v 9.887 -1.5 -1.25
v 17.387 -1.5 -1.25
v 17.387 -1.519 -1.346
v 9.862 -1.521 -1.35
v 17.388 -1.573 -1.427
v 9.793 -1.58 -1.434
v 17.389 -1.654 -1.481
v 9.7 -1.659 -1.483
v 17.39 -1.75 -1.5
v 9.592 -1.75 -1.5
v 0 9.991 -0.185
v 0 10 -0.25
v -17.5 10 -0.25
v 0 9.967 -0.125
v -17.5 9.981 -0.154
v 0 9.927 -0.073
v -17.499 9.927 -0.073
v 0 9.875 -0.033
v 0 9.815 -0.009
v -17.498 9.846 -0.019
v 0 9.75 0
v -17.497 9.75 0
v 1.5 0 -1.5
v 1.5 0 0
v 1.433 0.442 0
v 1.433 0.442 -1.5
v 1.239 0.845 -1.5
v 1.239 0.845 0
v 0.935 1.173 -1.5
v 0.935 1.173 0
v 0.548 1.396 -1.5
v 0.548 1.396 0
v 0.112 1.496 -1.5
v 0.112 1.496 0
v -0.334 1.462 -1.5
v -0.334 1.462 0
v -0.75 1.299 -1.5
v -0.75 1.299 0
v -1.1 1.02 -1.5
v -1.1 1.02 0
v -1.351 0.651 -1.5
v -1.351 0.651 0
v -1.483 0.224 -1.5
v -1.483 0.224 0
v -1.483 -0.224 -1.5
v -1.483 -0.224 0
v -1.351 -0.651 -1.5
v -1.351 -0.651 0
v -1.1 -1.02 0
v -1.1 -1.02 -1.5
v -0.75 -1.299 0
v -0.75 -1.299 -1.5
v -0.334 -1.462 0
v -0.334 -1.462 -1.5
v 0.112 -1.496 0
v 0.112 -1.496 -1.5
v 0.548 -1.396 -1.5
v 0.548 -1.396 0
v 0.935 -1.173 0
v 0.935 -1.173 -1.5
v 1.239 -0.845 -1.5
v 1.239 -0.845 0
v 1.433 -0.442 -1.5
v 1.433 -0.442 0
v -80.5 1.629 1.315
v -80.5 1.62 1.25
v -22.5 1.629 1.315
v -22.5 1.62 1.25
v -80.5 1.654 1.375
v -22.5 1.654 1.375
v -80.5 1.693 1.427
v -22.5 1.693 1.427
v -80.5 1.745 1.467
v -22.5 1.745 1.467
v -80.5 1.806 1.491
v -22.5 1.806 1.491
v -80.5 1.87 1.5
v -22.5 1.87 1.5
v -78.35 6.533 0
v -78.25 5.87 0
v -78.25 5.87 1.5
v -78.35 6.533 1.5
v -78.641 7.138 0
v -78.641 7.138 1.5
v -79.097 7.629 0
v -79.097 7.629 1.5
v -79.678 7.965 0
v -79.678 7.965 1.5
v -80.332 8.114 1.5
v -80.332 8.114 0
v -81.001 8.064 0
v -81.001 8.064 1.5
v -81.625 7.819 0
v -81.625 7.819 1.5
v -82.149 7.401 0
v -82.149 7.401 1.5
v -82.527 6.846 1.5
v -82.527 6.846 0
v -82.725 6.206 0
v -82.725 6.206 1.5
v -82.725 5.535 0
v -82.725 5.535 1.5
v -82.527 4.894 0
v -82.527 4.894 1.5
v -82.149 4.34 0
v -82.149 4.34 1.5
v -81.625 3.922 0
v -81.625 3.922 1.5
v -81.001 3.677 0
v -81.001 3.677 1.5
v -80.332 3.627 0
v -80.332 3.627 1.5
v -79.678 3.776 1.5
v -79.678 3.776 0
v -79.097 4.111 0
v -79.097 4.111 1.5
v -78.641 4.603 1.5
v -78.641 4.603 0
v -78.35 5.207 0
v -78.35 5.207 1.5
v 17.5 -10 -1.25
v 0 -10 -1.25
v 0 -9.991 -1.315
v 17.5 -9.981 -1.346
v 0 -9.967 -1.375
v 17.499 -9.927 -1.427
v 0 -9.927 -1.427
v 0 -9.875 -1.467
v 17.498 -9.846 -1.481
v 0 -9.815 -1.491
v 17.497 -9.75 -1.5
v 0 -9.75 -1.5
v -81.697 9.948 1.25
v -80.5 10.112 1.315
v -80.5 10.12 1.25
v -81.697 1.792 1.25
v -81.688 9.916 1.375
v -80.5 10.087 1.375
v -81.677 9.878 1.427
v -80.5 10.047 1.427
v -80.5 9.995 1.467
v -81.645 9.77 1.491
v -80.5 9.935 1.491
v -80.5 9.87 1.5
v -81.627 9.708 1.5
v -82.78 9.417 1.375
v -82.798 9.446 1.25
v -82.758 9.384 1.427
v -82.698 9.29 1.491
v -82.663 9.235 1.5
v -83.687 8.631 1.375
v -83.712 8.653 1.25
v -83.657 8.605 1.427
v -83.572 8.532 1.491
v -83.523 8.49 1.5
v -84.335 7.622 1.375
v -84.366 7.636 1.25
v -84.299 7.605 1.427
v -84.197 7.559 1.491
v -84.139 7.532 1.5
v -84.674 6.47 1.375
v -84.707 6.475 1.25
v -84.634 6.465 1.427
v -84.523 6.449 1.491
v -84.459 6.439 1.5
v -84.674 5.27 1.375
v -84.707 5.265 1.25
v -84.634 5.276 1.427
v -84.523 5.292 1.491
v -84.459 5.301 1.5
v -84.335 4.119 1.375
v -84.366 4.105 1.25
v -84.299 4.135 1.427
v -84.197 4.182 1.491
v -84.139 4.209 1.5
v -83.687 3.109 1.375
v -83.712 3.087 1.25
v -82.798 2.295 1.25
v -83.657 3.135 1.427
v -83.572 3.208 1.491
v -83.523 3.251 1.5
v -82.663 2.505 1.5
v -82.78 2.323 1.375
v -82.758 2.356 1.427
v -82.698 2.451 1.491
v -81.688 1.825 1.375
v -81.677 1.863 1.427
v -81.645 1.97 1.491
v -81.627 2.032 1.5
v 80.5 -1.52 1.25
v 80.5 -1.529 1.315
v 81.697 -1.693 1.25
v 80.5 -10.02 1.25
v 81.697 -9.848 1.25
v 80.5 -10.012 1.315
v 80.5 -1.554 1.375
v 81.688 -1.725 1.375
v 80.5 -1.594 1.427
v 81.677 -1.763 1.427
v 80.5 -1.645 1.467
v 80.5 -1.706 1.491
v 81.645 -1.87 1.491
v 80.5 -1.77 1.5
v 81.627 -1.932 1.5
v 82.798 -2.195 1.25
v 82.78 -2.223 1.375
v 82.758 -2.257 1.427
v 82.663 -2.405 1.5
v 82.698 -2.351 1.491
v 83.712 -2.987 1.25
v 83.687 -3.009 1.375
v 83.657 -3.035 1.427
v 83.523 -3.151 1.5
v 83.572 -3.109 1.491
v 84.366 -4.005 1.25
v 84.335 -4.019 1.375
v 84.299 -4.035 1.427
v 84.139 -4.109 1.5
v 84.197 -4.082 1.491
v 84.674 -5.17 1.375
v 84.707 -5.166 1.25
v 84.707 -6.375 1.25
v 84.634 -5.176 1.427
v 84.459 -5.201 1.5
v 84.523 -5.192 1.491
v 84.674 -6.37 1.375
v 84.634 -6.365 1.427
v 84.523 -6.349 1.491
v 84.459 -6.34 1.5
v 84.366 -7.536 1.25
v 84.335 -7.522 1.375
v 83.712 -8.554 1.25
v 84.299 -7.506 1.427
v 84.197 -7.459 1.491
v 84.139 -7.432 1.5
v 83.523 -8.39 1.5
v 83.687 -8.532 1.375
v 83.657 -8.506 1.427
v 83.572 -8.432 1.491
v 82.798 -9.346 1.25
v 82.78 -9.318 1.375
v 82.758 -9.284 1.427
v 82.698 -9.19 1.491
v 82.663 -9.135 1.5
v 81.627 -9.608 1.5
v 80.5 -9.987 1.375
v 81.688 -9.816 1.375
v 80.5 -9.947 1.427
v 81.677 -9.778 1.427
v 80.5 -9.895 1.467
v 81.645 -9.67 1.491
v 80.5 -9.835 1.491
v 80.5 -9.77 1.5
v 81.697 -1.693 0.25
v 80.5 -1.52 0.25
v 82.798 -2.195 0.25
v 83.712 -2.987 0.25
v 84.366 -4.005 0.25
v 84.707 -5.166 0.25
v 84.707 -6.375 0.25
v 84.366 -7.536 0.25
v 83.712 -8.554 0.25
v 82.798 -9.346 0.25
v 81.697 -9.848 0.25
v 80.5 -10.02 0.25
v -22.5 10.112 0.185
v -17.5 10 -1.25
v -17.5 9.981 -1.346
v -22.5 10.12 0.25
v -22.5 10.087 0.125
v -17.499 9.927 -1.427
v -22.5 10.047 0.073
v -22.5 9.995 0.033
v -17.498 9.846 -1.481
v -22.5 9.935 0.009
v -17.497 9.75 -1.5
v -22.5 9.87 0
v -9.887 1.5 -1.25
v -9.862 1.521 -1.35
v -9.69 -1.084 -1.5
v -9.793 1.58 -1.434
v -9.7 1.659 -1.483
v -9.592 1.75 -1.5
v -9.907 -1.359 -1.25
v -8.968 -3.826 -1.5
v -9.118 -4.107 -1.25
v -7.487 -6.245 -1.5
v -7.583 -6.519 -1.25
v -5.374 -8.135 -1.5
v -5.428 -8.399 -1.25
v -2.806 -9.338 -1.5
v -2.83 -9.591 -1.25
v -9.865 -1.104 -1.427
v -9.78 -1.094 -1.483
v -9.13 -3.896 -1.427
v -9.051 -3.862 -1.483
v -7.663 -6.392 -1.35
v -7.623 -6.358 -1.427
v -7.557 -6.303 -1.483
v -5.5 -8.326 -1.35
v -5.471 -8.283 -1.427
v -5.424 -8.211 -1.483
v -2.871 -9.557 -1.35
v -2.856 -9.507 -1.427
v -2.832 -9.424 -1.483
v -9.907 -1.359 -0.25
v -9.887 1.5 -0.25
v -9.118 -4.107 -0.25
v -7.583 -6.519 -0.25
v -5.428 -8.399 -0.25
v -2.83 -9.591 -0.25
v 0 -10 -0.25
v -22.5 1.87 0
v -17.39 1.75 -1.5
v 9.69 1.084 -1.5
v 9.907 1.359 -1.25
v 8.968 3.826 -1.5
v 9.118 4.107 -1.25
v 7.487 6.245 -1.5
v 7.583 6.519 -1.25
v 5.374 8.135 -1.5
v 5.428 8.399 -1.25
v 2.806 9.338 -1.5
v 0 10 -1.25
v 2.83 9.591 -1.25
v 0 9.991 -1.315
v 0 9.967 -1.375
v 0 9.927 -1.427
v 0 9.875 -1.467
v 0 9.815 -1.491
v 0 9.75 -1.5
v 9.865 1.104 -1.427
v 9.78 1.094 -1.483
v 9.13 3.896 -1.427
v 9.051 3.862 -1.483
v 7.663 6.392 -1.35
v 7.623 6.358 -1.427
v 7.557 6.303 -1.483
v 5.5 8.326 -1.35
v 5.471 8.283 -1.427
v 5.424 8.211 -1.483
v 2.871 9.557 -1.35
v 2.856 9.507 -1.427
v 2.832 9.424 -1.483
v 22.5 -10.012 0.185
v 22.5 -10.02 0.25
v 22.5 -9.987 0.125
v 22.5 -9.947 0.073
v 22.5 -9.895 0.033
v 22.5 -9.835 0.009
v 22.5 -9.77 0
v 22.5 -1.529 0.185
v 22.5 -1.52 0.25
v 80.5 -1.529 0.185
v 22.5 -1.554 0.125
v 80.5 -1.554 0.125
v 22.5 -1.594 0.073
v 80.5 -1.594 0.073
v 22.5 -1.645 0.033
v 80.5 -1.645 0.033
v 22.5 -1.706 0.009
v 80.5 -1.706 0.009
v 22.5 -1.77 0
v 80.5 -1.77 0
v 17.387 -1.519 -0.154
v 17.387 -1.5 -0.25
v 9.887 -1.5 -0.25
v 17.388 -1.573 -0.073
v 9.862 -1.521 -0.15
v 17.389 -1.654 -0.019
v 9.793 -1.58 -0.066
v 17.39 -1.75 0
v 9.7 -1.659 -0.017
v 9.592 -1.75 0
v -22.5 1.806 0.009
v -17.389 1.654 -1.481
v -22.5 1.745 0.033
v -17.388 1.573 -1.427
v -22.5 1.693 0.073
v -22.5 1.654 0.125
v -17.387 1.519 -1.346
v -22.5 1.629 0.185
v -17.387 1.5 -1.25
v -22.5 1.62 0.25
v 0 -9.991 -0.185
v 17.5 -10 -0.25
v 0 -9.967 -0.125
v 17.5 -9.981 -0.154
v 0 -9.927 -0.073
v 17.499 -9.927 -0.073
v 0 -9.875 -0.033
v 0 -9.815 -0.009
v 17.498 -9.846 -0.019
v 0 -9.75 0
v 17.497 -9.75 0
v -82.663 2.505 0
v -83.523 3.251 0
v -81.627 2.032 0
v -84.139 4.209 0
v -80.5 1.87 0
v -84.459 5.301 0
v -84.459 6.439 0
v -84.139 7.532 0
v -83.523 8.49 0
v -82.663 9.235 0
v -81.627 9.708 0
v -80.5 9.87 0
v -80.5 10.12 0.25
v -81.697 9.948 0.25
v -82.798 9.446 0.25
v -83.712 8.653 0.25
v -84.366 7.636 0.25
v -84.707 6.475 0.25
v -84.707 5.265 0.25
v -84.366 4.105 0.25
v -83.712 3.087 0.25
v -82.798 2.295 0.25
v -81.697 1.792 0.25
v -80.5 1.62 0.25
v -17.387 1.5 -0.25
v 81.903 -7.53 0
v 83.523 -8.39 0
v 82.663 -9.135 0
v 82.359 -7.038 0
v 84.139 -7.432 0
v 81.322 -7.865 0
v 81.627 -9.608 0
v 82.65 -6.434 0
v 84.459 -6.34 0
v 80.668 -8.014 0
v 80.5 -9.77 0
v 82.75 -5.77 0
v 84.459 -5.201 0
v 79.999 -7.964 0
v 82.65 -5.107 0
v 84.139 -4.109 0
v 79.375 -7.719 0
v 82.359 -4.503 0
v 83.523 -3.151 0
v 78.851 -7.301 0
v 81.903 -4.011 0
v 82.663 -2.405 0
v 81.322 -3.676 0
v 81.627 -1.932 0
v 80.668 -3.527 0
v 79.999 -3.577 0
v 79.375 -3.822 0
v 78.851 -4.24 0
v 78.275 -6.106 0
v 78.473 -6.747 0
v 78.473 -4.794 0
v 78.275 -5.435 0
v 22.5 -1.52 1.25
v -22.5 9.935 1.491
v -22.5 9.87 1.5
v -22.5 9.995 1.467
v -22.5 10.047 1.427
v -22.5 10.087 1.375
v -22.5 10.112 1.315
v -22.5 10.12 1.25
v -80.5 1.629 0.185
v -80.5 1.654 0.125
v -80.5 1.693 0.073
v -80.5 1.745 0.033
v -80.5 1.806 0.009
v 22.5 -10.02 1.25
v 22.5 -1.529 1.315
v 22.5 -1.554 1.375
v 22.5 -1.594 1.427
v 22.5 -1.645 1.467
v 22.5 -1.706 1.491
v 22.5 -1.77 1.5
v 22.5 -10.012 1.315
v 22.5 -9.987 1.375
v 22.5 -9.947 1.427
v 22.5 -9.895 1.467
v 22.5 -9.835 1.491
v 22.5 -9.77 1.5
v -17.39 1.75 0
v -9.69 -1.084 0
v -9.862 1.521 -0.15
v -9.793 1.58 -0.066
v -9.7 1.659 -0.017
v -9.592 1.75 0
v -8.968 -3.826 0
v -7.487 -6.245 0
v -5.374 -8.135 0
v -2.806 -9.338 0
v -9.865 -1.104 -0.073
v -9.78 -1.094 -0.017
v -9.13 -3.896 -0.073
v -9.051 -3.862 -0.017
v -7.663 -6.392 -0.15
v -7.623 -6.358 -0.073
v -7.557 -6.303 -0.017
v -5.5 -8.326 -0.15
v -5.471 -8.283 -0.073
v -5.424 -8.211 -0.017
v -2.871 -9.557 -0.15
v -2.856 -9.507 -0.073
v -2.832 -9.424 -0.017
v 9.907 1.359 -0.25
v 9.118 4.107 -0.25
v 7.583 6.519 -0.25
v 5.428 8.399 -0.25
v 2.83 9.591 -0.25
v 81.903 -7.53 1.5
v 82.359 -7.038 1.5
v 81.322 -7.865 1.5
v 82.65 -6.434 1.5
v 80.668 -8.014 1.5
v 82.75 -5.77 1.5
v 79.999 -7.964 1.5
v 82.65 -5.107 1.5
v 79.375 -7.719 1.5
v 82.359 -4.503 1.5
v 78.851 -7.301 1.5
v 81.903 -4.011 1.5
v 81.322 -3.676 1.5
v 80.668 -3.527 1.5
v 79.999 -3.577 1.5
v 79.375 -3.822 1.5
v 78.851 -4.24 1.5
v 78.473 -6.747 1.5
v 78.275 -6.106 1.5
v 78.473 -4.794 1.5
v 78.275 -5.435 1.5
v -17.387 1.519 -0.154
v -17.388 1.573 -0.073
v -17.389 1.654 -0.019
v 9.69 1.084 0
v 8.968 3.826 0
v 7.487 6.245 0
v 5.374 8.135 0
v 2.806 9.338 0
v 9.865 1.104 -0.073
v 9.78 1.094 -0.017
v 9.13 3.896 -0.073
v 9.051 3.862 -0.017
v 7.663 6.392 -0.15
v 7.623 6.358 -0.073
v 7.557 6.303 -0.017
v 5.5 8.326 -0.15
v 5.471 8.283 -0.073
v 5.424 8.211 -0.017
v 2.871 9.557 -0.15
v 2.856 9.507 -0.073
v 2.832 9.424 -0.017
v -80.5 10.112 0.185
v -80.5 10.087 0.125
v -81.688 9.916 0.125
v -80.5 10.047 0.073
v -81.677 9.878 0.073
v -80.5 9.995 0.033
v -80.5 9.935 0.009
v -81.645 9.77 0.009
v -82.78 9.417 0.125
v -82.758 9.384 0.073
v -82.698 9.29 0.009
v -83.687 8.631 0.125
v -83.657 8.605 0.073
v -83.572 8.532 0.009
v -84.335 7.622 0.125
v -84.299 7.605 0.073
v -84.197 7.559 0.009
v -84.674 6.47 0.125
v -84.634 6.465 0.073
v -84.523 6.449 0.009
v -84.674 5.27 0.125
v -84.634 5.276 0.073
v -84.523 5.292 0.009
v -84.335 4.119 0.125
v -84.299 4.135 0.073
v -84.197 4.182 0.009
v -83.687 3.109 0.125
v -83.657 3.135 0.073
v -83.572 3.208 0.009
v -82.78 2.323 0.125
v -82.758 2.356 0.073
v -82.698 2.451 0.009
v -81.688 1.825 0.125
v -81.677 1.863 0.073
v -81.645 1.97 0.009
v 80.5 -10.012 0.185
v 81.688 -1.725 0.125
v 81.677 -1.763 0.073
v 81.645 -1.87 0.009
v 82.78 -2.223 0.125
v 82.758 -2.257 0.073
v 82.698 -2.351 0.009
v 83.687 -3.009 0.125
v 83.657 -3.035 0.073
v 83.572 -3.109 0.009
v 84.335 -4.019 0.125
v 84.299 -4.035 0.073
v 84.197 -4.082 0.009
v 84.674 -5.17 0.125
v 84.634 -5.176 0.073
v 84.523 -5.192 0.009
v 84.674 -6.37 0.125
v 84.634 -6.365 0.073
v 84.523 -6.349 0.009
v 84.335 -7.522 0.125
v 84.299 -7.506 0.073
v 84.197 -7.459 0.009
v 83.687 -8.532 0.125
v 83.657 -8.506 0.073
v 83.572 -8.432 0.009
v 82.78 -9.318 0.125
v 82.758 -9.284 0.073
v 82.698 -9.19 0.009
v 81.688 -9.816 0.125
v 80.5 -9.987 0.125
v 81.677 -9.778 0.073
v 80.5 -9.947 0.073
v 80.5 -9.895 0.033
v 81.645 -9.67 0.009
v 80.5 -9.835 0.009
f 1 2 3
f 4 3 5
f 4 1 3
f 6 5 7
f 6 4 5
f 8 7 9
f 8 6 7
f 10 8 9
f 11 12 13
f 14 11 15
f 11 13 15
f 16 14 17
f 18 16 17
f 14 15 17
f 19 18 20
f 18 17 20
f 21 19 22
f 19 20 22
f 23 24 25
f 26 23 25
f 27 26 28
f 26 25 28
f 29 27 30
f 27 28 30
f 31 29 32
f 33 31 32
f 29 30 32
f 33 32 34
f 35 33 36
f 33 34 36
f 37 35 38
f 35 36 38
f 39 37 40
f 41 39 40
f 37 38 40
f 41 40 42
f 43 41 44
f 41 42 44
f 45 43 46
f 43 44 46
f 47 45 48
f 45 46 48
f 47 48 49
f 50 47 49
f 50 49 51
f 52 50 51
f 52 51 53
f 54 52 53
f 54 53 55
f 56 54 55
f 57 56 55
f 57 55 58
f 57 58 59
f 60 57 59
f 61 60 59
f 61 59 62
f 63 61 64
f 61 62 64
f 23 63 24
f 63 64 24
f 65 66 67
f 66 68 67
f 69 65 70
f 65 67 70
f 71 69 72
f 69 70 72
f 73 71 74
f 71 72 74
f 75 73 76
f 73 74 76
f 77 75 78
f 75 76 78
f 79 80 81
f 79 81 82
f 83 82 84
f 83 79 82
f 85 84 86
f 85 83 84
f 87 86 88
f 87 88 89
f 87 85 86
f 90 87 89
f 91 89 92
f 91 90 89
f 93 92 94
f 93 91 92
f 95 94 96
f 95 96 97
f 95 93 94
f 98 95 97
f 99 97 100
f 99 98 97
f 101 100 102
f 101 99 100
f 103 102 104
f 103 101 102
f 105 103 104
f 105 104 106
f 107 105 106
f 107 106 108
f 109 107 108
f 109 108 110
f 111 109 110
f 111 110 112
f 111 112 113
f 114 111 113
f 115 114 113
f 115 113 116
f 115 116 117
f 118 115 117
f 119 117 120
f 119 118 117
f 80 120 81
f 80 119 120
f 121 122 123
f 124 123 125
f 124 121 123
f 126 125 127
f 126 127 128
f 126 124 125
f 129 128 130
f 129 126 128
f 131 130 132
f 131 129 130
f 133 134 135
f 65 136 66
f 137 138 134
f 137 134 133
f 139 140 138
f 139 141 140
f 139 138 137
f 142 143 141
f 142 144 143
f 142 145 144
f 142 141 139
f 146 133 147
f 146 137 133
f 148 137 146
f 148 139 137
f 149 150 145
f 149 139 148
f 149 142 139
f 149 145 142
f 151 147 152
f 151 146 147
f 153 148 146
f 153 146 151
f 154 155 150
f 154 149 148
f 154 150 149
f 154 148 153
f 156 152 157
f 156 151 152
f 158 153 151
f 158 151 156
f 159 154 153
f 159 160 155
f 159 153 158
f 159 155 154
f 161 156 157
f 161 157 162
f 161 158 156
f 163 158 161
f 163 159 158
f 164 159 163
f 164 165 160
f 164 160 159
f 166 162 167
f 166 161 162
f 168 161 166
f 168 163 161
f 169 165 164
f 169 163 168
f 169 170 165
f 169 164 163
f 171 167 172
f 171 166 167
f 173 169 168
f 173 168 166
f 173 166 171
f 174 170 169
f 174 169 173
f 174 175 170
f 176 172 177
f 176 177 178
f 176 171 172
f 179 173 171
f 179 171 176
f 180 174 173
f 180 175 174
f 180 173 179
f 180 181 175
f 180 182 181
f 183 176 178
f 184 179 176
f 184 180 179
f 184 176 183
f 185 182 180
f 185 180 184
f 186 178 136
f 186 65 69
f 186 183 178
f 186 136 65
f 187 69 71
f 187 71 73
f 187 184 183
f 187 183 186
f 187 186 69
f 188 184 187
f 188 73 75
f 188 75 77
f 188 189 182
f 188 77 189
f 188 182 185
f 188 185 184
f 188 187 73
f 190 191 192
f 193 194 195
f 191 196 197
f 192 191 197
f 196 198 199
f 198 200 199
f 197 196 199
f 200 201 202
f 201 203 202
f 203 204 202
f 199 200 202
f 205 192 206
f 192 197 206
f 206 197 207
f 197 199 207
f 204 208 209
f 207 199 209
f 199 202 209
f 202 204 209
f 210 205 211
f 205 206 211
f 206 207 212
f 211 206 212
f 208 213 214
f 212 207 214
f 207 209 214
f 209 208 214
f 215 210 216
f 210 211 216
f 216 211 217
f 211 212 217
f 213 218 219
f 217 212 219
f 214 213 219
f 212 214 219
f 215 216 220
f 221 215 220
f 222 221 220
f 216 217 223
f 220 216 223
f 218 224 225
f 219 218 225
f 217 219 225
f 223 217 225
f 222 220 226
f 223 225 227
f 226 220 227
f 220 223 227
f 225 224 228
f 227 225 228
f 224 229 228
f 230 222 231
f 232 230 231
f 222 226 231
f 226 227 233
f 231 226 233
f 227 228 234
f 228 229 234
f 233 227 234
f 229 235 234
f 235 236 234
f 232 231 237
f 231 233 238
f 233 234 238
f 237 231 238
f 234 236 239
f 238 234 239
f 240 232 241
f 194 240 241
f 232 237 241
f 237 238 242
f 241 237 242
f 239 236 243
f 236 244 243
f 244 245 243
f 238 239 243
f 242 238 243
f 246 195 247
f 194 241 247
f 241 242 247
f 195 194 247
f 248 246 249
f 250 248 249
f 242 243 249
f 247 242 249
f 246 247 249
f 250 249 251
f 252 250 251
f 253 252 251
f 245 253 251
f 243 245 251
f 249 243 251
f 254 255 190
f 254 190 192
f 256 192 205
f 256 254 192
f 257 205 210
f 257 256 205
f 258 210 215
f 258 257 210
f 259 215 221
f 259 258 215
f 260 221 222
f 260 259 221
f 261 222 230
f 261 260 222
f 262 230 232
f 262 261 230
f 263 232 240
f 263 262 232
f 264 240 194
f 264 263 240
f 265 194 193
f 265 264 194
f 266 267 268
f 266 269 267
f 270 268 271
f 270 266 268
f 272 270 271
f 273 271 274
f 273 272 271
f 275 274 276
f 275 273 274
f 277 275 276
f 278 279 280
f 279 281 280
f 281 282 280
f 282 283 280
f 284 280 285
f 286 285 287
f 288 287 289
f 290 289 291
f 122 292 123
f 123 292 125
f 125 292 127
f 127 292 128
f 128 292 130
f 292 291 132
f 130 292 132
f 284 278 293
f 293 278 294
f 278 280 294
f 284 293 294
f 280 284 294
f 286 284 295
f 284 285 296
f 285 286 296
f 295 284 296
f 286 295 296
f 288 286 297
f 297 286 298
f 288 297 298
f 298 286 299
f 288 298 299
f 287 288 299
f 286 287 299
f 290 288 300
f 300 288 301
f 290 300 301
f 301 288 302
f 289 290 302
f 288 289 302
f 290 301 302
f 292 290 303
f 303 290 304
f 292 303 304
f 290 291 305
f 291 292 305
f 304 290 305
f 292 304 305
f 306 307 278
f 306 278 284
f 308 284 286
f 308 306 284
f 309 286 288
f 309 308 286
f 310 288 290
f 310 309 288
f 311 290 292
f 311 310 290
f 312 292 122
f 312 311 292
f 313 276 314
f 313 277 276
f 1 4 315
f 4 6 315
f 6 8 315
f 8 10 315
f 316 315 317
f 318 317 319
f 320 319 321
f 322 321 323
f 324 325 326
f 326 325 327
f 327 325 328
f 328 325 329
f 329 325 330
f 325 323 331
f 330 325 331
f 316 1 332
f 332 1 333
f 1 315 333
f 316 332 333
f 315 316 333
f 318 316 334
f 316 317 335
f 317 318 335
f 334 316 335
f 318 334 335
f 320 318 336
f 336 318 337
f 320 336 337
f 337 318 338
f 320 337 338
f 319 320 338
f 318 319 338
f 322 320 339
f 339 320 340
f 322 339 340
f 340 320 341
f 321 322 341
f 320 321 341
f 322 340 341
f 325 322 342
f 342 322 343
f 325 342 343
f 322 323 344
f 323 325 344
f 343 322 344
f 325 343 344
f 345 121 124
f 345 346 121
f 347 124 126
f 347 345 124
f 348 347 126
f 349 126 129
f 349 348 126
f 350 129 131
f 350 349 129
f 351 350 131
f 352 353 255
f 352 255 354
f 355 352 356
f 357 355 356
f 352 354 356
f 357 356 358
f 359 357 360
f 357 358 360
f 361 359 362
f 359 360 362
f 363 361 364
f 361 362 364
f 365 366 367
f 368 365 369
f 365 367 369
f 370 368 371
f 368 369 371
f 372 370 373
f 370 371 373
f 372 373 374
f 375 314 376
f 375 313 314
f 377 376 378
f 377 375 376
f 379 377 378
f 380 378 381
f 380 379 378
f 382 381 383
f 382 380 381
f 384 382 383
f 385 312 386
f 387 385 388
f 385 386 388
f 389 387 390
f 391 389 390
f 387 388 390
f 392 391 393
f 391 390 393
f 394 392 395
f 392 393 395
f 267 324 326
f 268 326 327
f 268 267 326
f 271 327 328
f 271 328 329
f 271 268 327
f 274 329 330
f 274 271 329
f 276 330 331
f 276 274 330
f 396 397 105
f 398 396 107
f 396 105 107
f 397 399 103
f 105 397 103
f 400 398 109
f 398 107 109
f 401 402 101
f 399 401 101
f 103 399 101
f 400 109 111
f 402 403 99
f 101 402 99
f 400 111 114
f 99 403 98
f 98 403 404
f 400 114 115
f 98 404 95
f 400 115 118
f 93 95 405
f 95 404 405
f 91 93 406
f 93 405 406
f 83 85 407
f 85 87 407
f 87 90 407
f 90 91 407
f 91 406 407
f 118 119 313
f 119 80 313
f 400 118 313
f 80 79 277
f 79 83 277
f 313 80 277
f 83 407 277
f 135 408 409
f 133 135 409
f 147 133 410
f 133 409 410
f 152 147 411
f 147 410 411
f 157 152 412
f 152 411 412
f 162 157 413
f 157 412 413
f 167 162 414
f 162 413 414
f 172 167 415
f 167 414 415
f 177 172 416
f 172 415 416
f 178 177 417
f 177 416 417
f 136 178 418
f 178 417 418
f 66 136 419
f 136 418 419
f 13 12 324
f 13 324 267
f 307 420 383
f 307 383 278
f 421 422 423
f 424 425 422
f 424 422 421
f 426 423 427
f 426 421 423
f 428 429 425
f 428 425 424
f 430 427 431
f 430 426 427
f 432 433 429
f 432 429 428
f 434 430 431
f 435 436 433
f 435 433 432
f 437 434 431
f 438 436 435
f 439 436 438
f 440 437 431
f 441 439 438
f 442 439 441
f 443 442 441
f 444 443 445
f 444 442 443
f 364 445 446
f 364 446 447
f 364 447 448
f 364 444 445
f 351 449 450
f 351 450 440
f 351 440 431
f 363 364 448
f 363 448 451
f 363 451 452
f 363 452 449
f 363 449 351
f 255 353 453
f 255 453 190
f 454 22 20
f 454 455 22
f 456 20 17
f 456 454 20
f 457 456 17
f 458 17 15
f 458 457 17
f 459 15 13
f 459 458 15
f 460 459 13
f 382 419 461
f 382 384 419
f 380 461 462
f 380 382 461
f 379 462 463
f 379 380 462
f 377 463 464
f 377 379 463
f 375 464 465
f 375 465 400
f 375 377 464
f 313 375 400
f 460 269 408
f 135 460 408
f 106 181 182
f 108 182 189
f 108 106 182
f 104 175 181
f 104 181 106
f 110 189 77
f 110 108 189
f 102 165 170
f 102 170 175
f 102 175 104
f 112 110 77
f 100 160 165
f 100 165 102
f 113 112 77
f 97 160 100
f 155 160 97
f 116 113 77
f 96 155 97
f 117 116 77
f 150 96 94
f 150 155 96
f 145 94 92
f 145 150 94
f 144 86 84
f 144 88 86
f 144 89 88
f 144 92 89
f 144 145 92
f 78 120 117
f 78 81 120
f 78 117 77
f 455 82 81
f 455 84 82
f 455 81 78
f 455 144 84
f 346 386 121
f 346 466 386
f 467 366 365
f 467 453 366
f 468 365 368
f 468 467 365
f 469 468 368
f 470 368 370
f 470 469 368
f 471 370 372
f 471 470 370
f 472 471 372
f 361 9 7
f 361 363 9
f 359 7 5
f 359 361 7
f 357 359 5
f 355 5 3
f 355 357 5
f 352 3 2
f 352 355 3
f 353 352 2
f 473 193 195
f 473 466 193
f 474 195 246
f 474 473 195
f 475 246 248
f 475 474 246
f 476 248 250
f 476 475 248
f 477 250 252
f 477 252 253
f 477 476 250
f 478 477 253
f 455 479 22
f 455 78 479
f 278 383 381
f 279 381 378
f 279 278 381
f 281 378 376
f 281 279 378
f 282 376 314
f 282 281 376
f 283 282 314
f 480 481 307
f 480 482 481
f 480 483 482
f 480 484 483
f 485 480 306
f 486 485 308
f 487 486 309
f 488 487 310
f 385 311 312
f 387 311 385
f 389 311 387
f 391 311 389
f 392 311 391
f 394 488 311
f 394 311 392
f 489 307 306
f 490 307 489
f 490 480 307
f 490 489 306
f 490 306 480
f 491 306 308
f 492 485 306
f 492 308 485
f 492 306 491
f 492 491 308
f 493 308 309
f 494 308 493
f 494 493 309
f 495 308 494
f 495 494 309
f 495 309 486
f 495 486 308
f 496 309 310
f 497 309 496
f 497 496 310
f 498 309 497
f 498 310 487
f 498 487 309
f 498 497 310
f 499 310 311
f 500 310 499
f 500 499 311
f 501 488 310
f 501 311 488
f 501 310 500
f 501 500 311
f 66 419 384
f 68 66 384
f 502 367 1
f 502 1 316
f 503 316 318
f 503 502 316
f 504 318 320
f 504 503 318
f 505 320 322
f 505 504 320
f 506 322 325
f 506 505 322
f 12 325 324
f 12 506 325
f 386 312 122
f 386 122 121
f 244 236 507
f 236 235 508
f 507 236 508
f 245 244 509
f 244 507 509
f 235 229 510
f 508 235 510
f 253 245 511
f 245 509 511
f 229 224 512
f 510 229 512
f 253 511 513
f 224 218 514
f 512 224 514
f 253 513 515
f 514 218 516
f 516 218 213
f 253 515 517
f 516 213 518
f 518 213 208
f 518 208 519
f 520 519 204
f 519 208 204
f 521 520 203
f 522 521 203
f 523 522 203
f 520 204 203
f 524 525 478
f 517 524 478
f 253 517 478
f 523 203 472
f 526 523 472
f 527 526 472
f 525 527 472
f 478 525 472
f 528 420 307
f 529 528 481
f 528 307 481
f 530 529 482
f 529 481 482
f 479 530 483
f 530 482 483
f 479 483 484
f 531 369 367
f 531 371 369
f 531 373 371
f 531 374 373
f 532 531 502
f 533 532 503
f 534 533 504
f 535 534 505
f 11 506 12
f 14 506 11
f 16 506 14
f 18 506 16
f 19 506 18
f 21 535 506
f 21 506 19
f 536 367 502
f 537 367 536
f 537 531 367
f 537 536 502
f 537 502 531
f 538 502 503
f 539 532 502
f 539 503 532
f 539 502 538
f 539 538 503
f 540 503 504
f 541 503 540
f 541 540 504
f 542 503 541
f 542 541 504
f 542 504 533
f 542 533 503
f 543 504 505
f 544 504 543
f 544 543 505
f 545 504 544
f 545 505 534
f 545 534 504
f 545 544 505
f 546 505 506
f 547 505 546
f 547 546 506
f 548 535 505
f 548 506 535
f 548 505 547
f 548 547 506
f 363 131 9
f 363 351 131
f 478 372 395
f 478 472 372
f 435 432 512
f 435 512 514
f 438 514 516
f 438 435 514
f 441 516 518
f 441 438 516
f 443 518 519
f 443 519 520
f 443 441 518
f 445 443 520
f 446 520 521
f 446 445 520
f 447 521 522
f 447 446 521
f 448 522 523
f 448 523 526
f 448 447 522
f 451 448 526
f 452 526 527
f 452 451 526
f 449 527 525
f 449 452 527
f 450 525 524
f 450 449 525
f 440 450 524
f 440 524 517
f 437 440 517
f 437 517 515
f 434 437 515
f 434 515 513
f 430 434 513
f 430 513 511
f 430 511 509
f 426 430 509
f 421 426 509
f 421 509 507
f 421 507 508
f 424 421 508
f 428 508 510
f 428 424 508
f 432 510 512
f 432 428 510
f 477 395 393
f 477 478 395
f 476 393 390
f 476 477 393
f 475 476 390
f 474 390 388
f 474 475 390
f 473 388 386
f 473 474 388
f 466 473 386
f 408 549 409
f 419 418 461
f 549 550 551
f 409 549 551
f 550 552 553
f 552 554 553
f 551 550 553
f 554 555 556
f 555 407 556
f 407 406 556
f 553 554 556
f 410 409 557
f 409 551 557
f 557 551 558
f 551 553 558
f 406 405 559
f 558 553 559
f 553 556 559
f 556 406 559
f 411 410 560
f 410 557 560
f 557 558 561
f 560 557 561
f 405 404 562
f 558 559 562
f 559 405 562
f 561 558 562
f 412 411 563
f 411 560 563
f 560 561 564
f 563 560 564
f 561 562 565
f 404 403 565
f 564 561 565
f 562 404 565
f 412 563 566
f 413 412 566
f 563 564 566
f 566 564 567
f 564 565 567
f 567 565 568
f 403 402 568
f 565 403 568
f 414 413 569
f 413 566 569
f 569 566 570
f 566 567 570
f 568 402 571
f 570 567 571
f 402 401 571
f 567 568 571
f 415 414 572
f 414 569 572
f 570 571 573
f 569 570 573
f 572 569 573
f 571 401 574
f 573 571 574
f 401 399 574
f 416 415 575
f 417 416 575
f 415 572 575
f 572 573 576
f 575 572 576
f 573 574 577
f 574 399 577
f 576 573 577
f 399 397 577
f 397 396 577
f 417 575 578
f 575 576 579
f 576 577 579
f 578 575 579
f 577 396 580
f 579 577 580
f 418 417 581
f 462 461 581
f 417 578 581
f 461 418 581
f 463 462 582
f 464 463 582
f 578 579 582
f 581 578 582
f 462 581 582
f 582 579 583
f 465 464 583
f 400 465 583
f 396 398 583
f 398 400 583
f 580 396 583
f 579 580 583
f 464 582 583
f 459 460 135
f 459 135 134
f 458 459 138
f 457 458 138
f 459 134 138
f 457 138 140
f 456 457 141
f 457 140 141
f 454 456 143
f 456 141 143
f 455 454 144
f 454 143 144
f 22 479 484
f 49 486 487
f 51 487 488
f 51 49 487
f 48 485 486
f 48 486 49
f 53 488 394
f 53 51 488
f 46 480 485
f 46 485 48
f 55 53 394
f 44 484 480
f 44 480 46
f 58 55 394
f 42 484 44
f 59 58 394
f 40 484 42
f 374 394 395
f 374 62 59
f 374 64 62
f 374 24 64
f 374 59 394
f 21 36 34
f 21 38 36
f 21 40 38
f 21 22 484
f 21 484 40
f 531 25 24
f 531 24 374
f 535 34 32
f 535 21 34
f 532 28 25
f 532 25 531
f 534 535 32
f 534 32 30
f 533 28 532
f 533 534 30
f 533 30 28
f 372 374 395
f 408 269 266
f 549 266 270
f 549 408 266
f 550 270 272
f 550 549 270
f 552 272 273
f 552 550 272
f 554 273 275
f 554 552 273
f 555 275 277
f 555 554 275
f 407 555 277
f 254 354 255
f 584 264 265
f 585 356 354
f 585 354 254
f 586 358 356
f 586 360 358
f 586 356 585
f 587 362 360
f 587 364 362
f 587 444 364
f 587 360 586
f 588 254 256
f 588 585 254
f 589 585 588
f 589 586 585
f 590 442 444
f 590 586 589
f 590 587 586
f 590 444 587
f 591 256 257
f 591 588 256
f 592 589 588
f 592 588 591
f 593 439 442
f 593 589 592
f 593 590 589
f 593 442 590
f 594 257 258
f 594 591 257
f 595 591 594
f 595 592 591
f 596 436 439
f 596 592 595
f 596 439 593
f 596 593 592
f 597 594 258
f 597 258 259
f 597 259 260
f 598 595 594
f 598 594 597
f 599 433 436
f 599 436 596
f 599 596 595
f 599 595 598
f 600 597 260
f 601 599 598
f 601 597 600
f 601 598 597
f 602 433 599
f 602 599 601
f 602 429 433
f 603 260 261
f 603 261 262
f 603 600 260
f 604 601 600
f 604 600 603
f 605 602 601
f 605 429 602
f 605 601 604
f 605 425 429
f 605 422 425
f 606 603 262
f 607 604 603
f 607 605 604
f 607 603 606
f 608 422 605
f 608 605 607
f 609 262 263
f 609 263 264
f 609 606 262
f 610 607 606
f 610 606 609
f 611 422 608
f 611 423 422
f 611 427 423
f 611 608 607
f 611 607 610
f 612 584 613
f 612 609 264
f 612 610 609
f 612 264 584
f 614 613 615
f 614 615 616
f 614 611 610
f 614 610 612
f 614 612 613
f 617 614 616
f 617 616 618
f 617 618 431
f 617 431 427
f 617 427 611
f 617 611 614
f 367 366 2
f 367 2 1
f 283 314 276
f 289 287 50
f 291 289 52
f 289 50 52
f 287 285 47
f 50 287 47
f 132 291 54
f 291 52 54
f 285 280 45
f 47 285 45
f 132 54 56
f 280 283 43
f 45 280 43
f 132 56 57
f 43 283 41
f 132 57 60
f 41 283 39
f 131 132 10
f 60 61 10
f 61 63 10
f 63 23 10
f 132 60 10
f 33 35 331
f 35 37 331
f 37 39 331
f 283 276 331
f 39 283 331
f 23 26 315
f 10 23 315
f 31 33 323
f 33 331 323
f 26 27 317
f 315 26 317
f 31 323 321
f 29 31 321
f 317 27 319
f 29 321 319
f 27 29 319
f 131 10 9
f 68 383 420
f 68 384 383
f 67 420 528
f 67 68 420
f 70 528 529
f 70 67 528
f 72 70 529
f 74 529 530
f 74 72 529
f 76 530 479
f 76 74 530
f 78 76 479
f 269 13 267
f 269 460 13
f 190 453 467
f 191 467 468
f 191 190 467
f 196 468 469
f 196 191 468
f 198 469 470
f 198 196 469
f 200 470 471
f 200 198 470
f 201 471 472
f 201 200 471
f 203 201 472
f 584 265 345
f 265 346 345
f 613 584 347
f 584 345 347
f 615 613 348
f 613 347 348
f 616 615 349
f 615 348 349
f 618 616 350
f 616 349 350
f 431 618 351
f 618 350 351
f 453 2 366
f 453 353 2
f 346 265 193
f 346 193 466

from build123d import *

# Parameters (mm, degrees)
SKETCH1_R             = 1.5
BOSS_EXTRUDE1_DEPTH   = 1.5
SKETCH2_R             = 2.25
BOSS_EXTRUDE2_DEPTH   = 1.5
BOSS_EXTRUDE2_2_DEPTH = 1.5
FILLET12_R            = 0.25
FILLET13_R            = 0.25
FILLET14_R            = 0.25


with BuildPart() as part:
    # Sketch1 → Boss-Extrude1 (new body)
    with BuildSketch(Plane.XY):
        with BuildLine():
            Line((-17.5, 10), (-17.386859967, 1.5))
            Line((-17.386859967, 1.5), (-9.886859967, 1.5))
            ThreePointArc((-9.886859967, 1.5), (-7.582875444, -6.519202405), (0, -10))
            Line((0, -10), (17.5, -10))
            Line((17.5, -10), (17.386859967, -1.5))
            Line((17.386859967, -1.5), (9.886859967, -1.5))
            ThreePointArc((9.886859967, -1.5), (7.582875444, 6.519202405), (0, 10))
            Line((0, 10), (-17.5, 10))
        make_face()
        Circle(SKETCH1_R, mode=Mode.SUBTRACT)
    extrude(amount=-BOSS_EXTRUDE1_DEPTH)

    # Fillet13
    fillet13_edges = [part.edges().sort_by_distance(p)[0] for p in [
        (13.636859967, -1.5, 0),
        (-8.75, 10, -1.5),
        (8.75, -10, 0),
        (-7.582875444, -6.519202405, 0),
        (-13.636859967, 1.5, 0),
        (-8.75, 10, 0),
        (7.582875444, 6.519202405, 0),
        (-13.636859967, 1.5, -1.5),
        (-7.582875444, -6.519202405, -1.5),
        (8.75, -10, -1.5),
        (13.636859967, -1.5, -1.5),
        (7.582875444, 6.519202405, -1.5),
    ]]
    fillet(fillet13_edges, radius=FILLET13_R)



with BuildPart() as body_2:
    # Sketch2 → Boss-Extrude2 (new body)
    with BuildSketch(Plane.XY):
        with BuildLine():
            Line((22.5, -1.520409702), (80.5, -1.520409702))
            ThreePointArc((80.5, -1.520409702), (84.75, -5.770409702), (80.5, -10.020409702))
            Line((80.5, -10.020409702), (22.5, -10.020409702))
            Line((22.5, -10.020409702), (22.5, -1.520409702))
        make_face()
        with Locations((80.5, -5.770409702)):
            Circle(SKETCH2_R, mode=Mode.SUBTRACT)
    extrude(amount=BOSS_EXTRUDE2_DEPTH)

    # Fillet12
    fillet12_edges = [body_2.edges().sort_by_distance(p)[0] for p in [
        (84.75, -5.770409702, 1.5),
        (51.5, -1.520409702, 1.5),
        (51.5, -1.520409702, 0),
        (84.75, -5.770409702, 0),
        (51.5, -10.020409702, 0),
        (51.5, -10.020409702, 1.5),
    ]]
    fillet(fillet12_edges, radius=FILLET12_R)


with BuildPart() as body_3:
    # Sketch2 → Boss-Extrude2 2 (new body)
    with BuildSketch(Plane.XY):
        with BuildLine():
            Line((-22.5, 10.120226545), (-80.5, 10.120226545))
            ThreePointArc((-80.5, 10.120226545), (-84.75, 5.870226545), (-80.5, 1.620226545))
            Line((-80.5, 1.620226545), (-22.5, 1.620226545))
            Line((-22.5, 1.620226545), (-22.5, 10.120226545))
        make_face()
        with Locations((-80.5, 5.870226545)):
            Circle(SKETCH2_R, mode=Mode.SUBTRACT)
    extrude(amount=BOSS_EXTRUDE2_2_DEPTH)

    # Fillet14
    fillet14_edges = [body_3.edges().sort_by_distance(p)[0] for p in [
        (-51.5, 10.120226545, 0),
        (-84.75, 5.870226545, 0),
        (-51.5, 1.620226545, 0),
        (-51.5, 10.120226545, 1.5),
        (-84.75, 5.870226545, 1.5),
        (-51.5, 1.620226545, 1.5),
    ]]
    fillet(fillet14_edges, radius=FILLET14_R)


with BuildPart() as part_1:
    add(part.part)

    add(body_2.part)  # loft3 joins it to this body
    # loft from a face of the part (loft3)
    loft([part_1.faces().sort_by_distance((17.443429983, -5.75, -0.75))[0], part_1.faces().sort_by_distance((22.5, -5.770409702, 0.75))[0]])


    add(body_3.part)  # loft4 joins it to this body
    # loft from a face of the part (loft4)
    loft([part_1.faces().sort_by_distance((-17.443429983, 5.75, -0.75))[0], part_1.faces().sort_by_distance((-22.5, 5.870226545, 0.75))[0]])


solid = part_1.part
